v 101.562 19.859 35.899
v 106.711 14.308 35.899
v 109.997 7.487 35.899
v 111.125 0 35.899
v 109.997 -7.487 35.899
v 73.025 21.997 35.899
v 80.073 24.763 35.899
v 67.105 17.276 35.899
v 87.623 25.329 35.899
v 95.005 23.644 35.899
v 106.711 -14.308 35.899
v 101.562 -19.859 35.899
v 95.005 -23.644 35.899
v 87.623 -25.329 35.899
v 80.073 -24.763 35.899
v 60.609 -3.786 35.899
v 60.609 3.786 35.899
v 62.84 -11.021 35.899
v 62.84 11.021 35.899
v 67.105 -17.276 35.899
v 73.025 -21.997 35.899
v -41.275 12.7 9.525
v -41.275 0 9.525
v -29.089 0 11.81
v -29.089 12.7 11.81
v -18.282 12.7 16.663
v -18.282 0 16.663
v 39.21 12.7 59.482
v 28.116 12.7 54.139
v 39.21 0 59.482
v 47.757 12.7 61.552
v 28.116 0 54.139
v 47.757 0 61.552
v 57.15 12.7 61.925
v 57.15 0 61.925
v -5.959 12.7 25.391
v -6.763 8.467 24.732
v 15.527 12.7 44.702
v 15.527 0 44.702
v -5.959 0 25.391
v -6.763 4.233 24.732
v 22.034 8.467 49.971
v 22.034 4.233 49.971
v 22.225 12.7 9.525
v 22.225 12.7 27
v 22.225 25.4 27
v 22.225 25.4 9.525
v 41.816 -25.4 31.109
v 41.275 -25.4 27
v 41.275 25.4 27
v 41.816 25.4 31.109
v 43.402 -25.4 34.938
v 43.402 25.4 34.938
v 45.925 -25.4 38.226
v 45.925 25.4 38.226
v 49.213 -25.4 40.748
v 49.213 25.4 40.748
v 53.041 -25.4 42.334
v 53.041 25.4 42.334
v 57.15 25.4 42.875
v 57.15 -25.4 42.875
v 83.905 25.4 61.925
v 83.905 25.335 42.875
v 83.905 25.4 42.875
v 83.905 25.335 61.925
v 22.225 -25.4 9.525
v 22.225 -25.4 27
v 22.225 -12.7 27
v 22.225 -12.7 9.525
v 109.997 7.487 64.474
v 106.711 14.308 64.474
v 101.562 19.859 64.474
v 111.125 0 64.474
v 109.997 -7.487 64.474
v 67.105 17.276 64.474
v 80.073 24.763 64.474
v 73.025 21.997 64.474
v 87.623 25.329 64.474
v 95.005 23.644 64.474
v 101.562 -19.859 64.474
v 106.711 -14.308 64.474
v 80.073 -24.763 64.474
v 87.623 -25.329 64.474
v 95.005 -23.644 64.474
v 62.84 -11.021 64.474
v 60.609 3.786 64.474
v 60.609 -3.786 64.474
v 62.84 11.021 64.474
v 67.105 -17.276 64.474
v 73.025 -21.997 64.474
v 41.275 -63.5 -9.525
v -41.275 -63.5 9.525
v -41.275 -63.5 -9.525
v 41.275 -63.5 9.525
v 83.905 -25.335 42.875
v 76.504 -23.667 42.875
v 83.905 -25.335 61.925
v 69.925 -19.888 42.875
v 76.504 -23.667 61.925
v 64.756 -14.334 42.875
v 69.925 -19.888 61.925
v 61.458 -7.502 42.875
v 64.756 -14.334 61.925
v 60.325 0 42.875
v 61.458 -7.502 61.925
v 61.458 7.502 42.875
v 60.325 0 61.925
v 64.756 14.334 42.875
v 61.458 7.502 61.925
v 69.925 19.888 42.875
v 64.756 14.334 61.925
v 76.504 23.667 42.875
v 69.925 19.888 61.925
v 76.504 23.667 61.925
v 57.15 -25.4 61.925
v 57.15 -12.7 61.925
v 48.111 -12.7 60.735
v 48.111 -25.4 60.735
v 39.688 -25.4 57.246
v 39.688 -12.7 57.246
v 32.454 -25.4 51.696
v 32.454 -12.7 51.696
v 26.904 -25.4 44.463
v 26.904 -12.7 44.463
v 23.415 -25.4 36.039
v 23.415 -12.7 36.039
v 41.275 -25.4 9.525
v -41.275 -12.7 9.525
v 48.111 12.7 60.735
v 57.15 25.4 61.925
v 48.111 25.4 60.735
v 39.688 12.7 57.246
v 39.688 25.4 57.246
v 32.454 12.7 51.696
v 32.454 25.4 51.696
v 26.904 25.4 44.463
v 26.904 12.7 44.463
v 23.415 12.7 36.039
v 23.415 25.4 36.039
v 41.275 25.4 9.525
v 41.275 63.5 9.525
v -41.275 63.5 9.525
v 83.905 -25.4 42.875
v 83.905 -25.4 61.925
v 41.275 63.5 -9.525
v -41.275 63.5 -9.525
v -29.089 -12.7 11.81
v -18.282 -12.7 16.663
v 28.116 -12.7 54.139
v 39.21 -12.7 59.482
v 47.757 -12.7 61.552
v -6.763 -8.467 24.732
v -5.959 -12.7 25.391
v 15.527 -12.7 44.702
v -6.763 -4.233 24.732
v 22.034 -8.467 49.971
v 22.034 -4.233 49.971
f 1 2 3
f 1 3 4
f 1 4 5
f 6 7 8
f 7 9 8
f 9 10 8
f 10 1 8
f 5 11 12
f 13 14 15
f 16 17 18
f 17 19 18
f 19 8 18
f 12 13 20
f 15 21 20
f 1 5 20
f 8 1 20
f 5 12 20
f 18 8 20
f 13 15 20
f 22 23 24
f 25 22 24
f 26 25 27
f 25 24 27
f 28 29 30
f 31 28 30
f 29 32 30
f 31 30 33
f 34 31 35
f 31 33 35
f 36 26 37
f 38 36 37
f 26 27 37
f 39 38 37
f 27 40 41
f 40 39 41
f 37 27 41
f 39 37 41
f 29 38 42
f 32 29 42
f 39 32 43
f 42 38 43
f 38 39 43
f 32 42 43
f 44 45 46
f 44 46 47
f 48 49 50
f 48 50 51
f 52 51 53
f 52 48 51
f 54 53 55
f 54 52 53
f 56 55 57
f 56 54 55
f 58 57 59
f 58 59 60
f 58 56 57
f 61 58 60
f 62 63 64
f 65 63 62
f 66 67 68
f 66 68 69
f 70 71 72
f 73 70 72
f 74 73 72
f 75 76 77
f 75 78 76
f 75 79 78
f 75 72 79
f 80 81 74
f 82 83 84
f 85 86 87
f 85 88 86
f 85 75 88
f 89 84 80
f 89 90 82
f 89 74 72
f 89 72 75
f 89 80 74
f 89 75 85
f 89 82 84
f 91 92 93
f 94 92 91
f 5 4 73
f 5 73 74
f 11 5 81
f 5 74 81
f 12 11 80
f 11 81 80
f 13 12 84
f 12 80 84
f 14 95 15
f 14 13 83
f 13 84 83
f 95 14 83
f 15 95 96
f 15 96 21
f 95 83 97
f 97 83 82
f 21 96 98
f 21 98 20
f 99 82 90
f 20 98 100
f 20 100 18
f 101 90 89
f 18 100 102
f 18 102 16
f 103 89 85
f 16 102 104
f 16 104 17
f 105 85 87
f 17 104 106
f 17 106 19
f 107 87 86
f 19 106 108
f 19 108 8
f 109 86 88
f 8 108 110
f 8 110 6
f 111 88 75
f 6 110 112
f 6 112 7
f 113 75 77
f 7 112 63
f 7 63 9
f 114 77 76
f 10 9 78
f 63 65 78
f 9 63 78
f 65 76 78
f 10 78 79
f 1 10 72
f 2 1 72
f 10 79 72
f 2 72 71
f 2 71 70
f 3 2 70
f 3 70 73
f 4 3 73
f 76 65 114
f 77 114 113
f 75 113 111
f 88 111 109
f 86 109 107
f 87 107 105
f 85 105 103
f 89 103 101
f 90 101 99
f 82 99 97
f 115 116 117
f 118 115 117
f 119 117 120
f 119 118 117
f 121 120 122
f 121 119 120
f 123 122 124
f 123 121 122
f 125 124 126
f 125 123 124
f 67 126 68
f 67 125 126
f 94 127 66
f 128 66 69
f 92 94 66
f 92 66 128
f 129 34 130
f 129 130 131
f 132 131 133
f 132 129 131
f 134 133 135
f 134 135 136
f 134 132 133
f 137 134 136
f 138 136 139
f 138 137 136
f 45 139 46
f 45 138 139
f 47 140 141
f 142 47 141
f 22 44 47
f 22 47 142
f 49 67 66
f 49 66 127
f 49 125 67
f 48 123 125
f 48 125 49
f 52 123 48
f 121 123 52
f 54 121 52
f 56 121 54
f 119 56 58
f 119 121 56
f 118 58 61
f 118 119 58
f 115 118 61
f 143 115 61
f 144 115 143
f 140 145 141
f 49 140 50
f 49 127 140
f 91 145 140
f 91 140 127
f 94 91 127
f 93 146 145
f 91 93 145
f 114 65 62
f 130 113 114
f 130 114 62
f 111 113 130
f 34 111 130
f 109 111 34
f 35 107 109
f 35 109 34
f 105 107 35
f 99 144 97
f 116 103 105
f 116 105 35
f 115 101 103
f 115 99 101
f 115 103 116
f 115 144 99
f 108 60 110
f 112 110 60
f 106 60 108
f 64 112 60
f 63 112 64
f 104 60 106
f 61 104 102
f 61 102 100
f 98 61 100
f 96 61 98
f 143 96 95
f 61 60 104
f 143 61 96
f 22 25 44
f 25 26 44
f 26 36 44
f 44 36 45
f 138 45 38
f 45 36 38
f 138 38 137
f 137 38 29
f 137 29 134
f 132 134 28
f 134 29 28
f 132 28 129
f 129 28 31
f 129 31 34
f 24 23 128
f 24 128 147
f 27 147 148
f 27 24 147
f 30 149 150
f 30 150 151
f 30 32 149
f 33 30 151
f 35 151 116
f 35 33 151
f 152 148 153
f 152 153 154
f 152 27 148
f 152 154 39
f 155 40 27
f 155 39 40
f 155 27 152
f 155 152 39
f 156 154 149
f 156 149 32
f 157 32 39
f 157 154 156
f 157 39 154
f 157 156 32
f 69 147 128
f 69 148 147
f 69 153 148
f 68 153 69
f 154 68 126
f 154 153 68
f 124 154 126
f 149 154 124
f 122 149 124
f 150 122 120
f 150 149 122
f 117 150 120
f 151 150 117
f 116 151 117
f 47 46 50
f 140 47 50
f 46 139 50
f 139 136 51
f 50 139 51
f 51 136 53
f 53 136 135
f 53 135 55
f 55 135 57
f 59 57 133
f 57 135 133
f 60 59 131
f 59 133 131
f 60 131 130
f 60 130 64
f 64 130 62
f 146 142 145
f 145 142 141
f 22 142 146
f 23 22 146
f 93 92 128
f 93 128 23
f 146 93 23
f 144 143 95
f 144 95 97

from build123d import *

# Parameters (mm, degrees)
F1_DEPTH = 63.5
F2_DEPTH = 12.7
F0_W     = 23.580307
F0_H     = 19.05
F3_DEPTH = 25.4
F0_W_2   = 25.4
F0_H_2   = 28.575


with BuildPart() as f1:
    # F0 (on Front) → F1 (new body, symmetric)
    with BuildSketch(Plane.XZ):
        Polygon((41.275, -9.525), (41.275, 9.525), (22.225, 9.525), (-41.275, 9.525), (-41.275, -9.525), align=None)
    extrude(amount=F1_DEPTH, both=True)

    # F0 (on Front) → F2 (join, symmetric)
    with BuildSketch(Plane.XZ):
        with BuildLine():
            Line((-41.275, 9.525), (22.225, 9.525))
            Line((22.225, 9.525), (22.225, 27.0002))
            ThreePointArc((22.225, 27.0002), (32.454296, 51.695904), (57.15, 61.9252))
            add(Edge.make_bspline(
                [(-41.275, 9.525), (0.105267, 11.943228), (14.862967, 64.384811), (57.15, 61.9252)],
                knots=[0, 0, 0, 0, 111.504536, 111.504536, 111.504536, 111.504536], degree=3))
        make_face()
    extrude(amount=F2_DEPTH, both=True)

    # F0 (on Front) → F3 (join, symmetric)
    with BuildSketch(Plane.XZ):
        with BuildLine():
            Line((22.225, 9.525), (41.275, 9.525))
            Line((41.275, 9.525), (41.275, 27.0002))
            ThreePointArc((41.275, 27.0002), (45.92468, 38.22552), (57.15, 42.8752))
            Line((57.15, 42.8752), (60.325, 42.8752))
            Line((60.325, 42.8752), (60.325, 61.9252))
            Line((60.325, 61.9252), (57.15, 61.9252))
            ThreePointArc((57.15, 61.9252), (32.454296, 51.695904), (22.225, 27.0002))
            Line((22.225, 27.0002), (22.225, 9.525))
        make_face()
        with Locations((72.115153, 52.4002)):
            Rectangle(F0_W, F0_H)
    extrude(amount=F3_DEPTH, both=True)

    # F0 (on Front) → F4 (revolve)
    with BuildSketch(Plane.XZ):
        with Locations((98.425, 50.186728)):
            Rectangle(F0_W_2, F0_H_2)
    revolve(axis=Axis((85.725, 0, 50.186728), (0, 0, -1)))


solid = f1.part
